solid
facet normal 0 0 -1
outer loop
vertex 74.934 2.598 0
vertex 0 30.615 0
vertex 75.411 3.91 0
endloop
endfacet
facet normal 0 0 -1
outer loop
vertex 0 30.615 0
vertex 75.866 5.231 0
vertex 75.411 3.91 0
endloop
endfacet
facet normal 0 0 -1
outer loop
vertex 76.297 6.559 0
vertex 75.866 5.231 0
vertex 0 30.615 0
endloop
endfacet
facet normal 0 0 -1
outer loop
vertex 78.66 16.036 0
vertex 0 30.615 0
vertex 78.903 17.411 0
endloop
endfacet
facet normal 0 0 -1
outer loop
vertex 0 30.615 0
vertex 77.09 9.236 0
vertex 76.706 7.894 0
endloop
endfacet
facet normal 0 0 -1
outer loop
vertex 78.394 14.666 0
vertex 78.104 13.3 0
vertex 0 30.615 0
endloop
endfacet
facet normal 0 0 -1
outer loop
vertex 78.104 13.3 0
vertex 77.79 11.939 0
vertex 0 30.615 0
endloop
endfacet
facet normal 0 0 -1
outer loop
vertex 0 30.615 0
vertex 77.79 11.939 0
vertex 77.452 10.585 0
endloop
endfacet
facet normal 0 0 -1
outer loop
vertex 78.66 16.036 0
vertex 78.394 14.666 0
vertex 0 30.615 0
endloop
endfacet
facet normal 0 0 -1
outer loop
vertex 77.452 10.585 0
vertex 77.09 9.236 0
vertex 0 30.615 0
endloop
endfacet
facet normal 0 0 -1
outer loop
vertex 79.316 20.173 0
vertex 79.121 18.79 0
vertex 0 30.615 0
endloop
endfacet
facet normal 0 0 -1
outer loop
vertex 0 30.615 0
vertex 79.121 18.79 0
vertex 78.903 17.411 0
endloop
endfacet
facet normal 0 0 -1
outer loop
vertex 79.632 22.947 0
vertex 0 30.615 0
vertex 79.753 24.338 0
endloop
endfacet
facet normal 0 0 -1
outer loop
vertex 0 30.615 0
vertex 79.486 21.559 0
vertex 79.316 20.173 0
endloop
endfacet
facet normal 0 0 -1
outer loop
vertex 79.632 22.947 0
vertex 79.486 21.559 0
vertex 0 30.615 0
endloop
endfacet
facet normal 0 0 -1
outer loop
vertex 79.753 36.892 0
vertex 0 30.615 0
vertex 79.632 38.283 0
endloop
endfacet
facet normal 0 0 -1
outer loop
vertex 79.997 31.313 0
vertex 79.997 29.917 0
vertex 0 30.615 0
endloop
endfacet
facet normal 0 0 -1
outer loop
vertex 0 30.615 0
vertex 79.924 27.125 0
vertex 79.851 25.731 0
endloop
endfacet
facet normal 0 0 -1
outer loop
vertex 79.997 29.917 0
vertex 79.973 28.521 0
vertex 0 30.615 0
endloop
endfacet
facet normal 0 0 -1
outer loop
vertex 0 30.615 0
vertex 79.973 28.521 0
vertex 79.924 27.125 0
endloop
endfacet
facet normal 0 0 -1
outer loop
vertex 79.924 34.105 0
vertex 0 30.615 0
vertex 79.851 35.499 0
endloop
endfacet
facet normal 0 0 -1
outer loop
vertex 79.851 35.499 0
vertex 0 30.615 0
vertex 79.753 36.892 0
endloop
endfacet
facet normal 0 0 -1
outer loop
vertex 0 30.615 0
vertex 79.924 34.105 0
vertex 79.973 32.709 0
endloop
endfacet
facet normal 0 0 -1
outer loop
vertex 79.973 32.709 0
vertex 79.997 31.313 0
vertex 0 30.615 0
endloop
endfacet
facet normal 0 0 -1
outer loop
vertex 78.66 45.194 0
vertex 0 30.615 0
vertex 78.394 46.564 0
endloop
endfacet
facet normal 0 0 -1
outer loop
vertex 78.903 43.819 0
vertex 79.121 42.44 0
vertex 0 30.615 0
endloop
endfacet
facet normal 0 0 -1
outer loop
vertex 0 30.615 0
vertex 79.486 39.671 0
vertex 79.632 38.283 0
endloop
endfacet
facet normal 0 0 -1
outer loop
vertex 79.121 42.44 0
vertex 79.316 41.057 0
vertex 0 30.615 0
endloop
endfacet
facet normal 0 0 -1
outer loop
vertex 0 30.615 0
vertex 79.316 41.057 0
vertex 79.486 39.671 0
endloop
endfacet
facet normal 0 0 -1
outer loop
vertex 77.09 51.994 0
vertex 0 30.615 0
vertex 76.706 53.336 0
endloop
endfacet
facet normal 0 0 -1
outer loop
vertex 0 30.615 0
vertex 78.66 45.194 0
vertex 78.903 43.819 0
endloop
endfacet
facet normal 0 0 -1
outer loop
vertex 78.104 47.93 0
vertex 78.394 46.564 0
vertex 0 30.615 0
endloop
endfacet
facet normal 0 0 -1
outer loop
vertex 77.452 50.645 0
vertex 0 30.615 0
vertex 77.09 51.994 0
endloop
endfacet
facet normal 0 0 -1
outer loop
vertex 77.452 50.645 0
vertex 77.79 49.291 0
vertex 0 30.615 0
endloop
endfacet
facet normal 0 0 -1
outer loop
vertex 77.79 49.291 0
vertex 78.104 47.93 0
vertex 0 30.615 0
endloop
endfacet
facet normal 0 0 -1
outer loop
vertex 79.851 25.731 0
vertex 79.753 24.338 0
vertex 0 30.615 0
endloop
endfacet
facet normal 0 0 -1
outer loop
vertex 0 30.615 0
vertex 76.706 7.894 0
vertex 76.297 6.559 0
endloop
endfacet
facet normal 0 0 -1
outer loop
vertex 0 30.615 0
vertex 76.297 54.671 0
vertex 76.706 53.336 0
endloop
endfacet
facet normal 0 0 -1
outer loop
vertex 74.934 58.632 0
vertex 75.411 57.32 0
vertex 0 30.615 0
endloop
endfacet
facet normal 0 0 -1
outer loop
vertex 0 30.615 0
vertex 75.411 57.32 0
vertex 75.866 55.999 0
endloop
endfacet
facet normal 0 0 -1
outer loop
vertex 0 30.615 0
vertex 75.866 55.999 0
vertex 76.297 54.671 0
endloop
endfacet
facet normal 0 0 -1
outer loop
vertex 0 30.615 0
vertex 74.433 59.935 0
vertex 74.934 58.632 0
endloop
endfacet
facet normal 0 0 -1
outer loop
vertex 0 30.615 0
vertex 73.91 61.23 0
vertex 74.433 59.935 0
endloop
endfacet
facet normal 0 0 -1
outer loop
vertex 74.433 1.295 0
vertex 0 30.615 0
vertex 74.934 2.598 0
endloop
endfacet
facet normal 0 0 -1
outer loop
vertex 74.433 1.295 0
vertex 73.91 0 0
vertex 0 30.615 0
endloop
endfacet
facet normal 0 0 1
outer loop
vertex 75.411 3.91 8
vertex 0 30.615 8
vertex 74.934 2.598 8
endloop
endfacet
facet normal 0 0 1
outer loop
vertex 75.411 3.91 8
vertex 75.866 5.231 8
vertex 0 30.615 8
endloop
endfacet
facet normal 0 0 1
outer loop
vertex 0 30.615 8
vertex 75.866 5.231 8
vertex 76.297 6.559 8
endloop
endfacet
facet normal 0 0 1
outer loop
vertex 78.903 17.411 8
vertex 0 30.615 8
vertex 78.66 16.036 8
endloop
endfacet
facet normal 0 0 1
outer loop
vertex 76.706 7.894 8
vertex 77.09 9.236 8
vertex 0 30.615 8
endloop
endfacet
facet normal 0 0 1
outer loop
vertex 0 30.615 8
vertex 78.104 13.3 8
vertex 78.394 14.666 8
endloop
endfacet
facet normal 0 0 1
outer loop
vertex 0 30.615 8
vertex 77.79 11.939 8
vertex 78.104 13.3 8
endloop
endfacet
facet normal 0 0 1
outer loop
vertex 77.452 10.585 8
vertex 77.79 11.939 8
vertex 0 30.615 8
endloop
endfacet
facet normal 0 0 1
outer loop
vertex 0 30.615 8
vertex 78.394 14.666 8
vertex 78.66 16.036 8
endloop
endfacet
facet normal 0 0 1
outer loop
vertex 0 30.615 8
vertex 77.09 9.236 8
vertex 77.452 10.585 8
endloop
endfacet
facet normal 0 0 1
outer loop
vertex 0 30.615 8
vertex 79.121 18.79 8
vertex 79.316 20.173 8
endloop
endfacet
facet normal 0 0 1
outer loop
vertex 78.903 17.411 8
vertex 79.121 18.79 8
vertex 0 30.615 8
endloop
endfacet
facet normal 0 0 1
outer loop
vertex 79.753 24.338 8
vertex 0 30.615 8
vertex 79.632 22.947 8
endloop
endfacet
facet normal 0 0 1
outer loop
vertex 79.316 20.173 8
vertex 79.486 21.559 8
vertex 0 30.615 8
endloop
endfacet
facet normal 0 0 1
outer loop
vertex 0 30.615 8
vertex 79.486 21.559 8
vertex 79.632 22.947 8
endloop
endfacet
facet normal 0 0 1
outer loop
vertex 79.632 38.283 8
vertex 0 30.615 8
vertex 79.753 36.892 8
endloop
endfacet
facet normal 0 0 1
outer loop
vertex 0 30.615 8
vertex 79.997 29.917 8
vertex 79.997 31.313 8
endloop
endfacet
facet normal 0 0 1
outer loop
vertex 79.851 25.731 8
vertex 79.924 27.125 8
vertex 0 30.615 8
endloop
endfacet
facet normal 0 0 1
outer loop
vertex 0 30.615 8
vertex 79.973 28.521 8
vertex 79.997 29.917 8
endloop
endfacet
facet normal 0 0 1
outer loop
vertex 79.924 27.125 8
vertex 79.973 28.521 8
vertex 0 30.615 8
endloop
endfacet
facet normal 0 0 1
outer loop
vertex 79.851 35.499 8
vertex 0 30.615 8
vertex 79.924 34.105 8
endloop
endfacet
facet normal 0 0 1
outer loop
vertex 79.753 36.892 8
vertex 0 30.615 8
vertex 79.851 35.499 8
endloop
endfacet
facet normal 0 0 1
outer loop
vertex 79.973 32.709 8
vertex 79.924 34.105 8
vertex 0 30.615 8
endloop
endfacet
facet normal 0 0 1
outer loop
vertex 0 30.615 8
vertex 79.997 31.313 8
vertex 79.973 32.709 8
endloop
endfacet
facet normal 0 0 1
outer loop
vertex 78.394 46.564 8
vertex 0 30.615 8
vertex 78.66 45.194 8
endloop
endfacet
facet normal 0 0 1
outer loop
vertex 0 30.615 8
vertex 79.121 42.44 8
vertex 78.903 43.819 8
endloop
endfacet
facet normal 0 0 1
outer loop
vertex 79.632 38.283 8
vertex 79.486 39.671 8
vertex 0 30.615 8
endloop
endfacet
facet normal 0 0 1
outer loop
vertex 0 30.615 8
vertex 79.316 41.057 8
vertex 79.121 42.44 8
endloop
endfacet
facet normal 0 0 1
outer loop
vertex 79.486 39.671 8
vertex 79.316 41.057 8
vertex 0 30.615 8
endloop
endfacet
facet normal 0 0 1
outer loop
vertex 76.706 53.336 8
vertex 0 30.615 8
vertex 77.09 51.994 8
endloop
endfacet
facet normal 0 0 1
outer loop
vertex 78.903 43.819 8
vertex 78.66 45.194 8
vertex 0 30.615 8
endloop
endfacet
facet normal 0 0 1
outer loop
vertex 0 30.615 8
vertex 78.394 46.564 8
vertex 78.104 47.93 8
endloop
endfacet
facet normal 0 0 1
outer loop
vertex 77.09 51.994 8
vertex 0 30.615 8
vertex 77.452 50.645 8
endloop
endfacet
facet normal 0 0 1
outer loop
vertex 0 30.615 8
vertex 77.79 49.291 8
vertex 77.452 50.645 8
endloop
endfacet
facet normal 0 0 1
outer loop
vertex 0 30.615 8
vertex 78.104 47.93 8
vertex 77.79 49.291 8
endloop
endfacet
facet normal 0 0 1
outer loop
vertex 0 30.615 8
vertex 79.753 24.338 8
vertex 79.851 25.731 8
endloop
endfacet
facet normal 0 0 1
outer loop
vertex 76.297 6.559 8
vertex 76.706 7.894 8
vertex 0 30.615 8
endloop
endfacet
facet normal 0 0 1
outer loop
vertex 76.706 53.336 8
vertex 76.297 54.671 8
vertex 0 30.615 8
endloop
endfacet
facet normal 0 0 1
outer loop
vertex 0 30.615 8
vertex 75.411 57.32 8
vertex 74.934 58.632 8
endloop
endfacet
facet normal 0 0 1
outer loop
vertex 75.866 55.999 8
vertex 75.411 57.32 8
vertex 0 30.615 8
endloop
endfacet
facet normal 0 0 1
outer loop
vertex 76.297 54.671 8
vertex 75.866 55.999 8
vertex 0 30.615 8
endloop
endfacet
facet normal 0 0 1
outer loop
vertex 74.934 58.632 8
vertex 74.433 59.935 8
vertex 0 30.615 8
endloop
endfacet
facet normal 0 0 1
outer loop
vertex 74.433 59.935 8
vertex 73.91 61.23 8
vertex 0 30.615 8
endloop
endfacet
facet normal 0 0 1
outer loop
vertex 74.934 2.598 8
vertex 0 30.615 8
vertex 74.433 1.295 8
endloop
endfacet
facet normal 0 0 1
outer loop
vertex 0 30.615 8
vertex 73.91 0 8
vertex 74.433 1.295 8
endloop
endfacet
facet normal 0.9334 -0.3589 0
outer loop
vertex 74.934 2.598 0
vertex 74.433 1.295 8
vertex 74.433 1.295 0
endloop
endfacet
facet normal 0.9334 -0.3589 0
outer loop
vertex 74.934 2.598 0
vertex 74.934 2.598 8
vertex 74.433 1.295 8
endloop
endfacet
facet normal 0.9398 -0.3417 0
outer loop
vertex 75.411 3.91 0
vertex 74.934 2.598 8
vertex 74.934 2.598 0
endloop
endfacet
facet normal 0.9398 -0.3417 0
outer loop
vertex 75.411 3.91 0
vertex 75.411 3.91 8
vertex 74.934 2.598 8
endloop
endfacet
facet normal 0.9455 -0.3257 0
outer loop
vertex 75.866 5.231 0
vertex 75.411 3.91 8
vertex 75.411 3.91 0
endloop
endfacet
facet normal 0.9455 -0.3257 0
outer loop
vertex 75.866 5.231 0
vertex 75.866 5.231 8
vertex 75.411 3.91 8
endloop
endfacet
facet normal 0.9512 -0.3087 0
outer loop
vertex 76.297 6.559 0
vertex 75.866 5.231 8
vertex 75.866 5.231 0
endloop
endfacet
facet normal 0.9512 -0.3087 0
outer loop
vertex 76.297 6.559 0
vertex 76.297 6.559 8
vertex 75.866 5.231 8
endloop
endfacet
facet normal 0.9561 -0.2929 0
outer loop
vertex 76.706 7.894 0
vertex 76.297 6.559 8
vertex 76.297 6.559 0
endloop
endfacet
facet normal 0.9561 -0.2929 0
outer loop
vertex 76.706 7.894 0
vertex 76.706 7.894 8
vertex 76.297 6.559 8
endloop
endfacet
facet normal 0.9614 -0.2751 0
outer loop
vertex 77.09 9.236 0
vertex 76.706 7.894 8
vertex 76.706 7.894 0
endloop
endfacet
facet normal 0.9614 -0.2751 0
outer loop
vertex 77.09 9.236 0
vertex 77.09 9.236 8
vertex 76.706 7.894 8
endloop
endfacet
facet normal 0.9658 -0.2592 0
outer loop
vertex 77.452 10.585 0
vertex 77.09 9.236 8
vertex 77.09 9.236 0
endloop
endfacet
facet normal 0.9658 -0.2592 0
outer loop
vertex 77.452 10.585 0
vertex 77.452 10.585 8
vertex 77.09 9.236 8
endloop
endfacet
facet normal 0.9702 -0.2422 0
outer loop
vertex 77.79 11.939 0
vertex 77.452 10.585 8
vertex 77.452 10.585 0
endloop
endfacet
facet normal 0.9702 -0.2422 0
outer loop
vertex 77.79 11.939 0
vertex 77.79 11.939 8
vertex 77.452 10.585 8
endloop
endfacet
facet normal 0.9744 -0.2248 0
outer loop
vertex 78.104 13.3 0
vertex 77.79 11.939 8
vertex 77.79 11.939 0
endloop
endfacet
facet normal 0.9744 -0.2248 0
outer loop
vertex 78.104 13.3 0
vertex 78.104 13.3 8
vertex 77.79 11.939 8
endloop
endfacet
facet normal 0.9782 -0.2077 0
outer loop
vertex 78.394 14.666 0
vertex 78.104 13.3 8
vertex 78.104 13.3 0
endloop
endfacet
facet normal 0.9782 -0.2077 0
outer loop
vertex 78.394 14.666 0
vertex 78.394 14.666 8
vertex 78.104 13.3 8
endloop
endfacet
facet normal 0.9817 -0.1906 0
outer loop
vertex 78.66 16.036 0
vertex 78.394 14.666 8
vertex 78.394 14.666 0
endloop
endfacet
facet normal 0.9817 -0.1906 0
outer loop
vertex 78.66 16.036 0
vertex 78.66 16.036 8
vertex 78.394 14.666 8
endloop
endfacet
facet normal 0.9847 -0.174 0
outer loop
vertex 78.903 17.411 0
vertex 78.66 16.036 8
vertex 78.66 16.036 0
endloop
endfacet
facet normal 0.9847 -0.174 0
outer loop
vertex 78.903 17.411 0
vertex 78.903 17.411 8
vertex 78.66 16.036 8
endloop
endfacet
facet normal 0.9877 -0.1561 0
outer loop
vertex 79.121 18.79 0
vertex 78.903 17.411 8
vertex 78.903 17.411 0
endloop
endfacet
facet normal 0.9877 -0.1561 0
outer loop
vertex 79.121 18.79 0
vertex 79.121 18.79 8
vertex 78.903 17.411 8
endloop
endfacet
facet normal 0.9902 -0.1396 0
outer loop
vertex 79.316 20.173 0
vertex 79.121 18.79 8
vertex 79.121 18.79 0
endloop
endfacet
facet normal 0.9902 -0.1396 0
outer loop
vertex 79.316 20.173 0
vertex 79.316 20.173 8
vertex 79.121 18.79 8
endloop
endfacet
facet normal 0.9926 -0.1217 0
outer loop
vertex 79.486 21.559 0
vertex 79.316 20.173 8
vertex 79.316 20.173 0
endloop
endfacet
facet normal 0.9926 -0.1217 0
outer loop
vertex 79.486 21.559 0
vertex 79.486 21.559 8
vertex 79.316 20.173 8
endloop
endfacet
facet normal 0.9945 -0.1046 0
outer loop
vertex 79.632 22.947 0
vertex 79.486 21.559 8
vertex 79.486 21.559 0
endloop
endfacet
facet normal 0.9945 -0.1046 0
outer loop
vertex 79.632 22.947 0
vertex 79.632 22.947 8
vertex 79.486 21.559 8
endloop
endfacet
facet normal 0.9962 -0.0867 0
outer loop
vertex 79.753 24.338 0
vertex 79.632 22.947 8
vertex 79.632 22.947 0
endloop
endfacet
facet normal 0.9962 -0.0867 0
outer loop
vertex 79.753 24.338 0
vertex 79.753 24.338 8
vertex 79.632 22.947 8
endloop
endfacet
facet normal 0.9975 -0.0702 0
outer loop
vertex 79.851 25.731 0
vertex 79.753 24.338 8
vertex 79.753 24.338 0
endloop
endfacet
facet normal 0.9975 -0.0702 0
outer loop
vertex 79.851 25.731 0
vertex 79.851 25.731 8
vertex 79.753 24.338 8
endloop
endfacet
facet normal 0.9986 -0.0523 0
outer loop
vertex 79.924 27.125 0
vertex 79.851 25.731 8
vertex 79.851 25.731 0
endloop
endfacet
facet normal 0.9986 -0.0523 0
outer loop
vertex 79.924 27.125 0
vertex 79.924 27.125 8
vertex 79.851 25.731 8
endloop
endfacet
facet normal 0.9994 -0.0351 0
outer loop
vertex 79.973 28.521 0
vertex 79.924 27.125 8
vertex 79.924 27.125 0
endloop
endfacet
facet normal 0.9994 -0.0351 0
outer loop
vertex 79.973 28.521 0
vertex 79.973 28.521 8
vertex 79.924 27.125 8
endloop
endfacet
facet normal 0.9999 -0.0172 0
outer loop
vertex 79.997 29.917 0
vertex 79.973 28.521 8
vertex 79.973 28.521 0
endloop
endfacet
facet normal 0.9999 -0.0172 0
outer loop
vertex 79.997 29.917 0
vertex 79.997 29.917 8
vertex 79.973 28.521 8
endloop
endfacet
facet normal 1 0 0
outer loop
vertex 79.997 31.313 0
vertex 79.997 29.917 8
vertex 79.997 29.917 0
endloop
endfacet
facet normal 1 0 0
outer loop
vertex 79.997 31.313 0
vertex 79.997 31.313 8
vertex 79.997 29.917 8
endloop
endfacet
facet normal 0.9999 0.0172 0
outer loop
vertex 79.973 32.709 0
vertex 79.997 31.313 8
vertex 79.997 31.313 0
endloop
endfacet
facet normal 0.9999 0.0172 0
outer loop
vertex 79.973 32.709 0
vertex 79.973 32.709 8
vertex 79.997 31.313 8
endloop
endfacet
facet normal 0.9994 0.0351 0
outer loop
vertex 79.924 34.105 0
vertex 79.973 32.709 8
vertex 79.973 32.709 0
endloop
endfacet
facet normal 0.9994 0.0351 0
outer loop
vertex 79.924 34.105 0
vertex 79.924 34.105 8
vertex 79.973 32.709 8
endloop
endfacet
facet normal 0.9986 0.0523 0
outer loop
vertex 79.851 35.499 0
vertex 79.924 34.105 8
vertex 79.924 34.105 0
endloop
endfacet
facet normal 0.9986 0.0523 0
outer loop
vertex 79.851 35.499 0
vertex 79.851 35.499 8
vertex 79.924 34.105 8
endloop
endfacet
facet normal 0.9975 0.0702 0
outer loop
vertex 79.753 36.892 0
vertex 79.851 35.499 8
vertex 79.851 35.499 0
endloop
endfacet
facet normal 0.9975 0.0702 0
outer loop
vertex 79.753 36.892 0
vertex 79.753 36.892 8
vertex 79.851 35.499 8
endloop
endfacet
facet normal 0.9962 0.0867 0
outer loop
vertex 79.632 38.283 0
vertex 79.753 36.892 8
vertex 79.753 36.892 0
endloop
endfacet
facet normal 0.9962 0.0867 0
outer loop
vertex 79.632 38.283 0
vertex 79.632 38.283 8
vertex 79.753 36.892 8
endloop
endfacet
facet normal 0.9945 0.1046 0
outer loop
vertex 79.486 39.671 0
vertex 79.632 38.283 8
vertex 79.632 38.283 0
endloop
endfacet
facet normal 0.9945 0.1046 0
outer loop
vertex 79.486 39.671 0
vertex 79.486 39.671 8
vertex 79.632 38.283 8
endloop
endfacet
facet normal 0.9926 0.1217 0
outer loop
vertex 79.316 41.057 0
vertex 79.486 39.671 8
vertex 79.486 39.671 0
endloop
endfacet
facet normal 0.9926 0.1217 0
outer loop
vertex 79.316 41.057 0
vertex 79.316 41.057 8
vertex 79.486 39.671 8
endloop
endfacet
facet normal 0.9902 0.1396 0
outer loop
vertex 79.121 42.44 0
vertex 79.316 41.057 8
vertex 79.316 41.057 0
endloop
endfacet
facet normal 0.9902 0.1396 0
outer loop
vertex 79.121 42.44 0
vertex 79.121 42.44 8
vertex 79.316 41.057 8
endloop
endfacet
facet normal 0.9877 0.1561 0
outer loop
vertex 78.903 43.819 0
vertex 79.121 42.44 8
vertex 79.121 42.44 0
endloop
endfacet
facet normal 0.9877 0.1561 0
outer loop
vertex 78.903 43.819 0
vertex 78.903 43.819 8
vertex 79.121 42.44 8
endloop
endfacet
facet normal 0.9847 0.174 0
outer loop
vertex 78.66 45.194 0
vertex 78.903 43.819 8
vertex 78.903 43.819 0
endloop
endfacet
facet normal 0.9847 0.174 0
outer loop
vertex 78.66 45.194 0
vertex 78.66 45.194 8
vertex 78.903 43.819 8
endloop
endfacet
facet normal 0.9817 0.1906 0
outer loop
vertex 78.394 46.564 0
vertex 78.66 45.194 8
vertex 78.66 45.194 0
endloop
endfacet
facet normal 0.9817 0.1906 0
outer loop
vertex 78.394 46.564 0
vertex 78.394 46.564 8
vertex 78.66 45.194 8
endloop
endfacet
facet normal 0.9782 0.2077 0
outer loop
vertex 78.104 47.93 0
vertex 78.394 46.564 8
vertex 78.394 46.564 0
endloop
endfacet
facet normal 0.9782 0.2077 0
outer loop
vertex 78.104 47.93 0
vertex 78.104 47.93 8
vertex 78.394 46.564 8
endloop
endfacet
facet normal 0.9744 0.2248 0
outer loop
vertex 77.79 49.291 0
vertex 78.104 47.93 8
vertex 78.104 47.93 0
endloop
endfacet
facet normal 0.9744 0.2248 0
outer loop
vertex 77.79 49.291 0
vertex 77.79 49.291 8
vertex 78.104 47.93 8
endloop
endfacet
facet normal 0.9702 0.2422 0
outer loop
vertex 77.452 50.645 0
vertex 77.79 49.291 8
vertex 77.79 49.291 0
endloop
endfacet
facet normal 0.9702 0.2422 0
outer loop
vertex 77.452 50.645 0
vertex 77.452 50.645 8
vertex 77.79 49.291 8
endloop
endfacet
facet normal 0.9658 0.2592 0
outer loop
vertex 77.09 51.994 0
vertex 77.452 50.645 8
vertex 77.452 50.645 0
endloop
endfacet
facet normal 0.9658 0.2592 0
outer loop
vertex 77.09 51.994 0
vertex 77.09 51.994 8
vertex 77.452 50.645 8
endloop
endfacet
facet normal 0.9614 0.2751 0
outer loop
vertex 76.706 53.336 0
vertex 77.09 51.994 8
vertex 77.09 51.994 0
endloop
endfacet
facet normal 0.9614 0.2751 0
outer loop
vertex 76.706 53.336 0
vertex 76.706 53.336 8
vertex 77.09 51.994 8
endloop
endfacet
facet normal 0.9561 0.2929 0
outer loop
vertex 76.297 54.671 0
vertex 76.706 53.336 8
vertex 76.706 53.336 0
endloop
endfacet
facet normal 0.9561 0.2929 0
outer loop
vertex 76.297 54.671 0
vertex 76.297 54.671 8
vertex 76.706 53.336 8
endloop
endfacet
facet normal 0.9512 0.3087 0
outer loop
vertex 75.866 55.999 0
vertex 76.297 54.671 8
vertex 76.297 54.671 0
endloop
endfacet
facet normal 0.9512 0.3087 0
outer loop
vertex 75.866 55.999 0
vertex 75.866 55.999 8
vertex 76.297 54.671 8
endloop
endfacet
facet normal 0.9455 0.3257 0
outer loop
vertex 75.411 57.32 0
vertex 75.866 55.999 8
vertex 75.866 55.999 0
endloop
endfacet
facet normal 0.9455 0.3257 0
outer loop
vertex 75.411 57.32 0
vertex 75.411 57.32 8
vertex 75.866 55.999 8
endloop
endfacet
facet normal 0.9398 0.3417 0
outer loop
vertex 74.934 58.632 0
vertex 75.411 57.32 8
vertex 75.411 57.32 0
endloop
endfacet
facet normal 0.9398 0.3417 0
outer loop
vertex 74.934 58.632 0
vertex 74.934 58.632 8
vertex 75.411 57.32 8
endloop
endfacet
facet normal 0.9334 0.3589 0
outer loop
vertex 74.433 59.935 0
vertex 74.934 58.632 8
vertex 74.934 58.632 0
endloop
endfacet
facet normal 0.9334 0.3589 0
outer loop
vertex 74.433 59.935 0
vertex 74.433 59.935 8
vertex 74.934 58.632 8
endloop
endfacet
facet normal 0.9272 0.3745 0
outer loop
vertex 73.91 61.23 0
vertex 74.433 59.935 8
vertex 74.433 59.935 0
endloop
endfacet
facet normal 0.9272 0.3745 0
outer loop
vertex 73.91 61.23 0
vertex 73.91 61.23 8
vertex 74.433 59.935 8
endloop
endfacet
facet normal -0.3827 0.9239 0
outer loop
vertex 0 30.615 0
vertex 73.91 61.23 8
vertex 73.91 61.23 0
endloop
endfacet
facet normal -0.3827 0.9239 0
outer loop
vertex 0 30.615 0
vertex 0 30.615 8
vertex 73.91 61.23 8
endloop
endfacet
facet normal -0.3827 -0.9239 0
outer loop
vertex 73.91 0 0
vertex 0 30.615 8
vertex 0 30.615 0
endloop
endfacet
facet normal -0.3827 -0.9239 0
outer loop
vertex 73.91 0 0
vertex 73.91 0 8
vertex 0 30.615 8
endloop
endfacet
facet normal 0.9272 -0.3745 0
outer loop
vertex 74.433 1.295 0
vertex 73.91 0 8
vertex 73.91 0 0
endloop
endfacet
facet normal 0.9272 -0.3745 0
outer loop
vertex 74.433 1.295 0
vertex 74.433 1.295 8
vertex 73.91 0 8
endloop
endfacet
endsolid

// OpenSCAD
$fn = 32;

// ----------------------------------------------------------------------
// Arc profile plate: sector, 47 points
// ----------------------------------------------------------------------

// --- parameters (mm) ---
sector_angle = 45;        // sector angle, degrees
sector_r = 80;            // outer radius
arc_step = 1;             // sampling step of the arc, degrees
plate_t = 8;              // plate thickness, Z

bbox_x = 2 * sector_r * sin(sector_angle / 2);  // chord of the sector
bbox_y = sector_r;  // depth of the sector (apex to arc)

profile = [[73.91, 0], [74.433, 1.295], [74.934, 2.598], [75.411, 3.91], [75.866, 5.231], [76.297, 6.559], [76.706, 7.894], [77.09, 9.236], [77.452, 10.585], [77.79, 11.939], [78.104, 13.3], [78.394, 14.666], [78.66, 16.036], [78.903, 17.411], [79.121, 18.79], [79.316, 20.173], [79.486, 21.559], [79.632, 22.947], [79.753, 24.338], [79.851, 25.731], [79.924, 27.125], [79.973, 28.521], [79.997, 29.917], [79.997, 31.313], [79.973, 32.709], [79.924, 34.105], [79.851, 35.499], [79.753, 36.892], [79.632, 38.283], [79.486, 39.671], [79.316, 41.057], [79.121, 42.44], [78.903, 43.819], [78.66, 45.194], [78.394, 46.564], [78.104, 47.93], [77.79, 49.291], [77.452, 50.645], [77.09, 51.994], [76.706, 53.336], [76.297, 54.671], [75.866, 55.999], [75.411, 57.32], [74.934, 58.632], [74.433, 59.935], [73.91, 61.23], [0, 30.615]];  // primary outline, 47 points, counter clockwise

// --- the one profile operation ---
linear_extrude(height = plate_t) polygon(points = profile);
